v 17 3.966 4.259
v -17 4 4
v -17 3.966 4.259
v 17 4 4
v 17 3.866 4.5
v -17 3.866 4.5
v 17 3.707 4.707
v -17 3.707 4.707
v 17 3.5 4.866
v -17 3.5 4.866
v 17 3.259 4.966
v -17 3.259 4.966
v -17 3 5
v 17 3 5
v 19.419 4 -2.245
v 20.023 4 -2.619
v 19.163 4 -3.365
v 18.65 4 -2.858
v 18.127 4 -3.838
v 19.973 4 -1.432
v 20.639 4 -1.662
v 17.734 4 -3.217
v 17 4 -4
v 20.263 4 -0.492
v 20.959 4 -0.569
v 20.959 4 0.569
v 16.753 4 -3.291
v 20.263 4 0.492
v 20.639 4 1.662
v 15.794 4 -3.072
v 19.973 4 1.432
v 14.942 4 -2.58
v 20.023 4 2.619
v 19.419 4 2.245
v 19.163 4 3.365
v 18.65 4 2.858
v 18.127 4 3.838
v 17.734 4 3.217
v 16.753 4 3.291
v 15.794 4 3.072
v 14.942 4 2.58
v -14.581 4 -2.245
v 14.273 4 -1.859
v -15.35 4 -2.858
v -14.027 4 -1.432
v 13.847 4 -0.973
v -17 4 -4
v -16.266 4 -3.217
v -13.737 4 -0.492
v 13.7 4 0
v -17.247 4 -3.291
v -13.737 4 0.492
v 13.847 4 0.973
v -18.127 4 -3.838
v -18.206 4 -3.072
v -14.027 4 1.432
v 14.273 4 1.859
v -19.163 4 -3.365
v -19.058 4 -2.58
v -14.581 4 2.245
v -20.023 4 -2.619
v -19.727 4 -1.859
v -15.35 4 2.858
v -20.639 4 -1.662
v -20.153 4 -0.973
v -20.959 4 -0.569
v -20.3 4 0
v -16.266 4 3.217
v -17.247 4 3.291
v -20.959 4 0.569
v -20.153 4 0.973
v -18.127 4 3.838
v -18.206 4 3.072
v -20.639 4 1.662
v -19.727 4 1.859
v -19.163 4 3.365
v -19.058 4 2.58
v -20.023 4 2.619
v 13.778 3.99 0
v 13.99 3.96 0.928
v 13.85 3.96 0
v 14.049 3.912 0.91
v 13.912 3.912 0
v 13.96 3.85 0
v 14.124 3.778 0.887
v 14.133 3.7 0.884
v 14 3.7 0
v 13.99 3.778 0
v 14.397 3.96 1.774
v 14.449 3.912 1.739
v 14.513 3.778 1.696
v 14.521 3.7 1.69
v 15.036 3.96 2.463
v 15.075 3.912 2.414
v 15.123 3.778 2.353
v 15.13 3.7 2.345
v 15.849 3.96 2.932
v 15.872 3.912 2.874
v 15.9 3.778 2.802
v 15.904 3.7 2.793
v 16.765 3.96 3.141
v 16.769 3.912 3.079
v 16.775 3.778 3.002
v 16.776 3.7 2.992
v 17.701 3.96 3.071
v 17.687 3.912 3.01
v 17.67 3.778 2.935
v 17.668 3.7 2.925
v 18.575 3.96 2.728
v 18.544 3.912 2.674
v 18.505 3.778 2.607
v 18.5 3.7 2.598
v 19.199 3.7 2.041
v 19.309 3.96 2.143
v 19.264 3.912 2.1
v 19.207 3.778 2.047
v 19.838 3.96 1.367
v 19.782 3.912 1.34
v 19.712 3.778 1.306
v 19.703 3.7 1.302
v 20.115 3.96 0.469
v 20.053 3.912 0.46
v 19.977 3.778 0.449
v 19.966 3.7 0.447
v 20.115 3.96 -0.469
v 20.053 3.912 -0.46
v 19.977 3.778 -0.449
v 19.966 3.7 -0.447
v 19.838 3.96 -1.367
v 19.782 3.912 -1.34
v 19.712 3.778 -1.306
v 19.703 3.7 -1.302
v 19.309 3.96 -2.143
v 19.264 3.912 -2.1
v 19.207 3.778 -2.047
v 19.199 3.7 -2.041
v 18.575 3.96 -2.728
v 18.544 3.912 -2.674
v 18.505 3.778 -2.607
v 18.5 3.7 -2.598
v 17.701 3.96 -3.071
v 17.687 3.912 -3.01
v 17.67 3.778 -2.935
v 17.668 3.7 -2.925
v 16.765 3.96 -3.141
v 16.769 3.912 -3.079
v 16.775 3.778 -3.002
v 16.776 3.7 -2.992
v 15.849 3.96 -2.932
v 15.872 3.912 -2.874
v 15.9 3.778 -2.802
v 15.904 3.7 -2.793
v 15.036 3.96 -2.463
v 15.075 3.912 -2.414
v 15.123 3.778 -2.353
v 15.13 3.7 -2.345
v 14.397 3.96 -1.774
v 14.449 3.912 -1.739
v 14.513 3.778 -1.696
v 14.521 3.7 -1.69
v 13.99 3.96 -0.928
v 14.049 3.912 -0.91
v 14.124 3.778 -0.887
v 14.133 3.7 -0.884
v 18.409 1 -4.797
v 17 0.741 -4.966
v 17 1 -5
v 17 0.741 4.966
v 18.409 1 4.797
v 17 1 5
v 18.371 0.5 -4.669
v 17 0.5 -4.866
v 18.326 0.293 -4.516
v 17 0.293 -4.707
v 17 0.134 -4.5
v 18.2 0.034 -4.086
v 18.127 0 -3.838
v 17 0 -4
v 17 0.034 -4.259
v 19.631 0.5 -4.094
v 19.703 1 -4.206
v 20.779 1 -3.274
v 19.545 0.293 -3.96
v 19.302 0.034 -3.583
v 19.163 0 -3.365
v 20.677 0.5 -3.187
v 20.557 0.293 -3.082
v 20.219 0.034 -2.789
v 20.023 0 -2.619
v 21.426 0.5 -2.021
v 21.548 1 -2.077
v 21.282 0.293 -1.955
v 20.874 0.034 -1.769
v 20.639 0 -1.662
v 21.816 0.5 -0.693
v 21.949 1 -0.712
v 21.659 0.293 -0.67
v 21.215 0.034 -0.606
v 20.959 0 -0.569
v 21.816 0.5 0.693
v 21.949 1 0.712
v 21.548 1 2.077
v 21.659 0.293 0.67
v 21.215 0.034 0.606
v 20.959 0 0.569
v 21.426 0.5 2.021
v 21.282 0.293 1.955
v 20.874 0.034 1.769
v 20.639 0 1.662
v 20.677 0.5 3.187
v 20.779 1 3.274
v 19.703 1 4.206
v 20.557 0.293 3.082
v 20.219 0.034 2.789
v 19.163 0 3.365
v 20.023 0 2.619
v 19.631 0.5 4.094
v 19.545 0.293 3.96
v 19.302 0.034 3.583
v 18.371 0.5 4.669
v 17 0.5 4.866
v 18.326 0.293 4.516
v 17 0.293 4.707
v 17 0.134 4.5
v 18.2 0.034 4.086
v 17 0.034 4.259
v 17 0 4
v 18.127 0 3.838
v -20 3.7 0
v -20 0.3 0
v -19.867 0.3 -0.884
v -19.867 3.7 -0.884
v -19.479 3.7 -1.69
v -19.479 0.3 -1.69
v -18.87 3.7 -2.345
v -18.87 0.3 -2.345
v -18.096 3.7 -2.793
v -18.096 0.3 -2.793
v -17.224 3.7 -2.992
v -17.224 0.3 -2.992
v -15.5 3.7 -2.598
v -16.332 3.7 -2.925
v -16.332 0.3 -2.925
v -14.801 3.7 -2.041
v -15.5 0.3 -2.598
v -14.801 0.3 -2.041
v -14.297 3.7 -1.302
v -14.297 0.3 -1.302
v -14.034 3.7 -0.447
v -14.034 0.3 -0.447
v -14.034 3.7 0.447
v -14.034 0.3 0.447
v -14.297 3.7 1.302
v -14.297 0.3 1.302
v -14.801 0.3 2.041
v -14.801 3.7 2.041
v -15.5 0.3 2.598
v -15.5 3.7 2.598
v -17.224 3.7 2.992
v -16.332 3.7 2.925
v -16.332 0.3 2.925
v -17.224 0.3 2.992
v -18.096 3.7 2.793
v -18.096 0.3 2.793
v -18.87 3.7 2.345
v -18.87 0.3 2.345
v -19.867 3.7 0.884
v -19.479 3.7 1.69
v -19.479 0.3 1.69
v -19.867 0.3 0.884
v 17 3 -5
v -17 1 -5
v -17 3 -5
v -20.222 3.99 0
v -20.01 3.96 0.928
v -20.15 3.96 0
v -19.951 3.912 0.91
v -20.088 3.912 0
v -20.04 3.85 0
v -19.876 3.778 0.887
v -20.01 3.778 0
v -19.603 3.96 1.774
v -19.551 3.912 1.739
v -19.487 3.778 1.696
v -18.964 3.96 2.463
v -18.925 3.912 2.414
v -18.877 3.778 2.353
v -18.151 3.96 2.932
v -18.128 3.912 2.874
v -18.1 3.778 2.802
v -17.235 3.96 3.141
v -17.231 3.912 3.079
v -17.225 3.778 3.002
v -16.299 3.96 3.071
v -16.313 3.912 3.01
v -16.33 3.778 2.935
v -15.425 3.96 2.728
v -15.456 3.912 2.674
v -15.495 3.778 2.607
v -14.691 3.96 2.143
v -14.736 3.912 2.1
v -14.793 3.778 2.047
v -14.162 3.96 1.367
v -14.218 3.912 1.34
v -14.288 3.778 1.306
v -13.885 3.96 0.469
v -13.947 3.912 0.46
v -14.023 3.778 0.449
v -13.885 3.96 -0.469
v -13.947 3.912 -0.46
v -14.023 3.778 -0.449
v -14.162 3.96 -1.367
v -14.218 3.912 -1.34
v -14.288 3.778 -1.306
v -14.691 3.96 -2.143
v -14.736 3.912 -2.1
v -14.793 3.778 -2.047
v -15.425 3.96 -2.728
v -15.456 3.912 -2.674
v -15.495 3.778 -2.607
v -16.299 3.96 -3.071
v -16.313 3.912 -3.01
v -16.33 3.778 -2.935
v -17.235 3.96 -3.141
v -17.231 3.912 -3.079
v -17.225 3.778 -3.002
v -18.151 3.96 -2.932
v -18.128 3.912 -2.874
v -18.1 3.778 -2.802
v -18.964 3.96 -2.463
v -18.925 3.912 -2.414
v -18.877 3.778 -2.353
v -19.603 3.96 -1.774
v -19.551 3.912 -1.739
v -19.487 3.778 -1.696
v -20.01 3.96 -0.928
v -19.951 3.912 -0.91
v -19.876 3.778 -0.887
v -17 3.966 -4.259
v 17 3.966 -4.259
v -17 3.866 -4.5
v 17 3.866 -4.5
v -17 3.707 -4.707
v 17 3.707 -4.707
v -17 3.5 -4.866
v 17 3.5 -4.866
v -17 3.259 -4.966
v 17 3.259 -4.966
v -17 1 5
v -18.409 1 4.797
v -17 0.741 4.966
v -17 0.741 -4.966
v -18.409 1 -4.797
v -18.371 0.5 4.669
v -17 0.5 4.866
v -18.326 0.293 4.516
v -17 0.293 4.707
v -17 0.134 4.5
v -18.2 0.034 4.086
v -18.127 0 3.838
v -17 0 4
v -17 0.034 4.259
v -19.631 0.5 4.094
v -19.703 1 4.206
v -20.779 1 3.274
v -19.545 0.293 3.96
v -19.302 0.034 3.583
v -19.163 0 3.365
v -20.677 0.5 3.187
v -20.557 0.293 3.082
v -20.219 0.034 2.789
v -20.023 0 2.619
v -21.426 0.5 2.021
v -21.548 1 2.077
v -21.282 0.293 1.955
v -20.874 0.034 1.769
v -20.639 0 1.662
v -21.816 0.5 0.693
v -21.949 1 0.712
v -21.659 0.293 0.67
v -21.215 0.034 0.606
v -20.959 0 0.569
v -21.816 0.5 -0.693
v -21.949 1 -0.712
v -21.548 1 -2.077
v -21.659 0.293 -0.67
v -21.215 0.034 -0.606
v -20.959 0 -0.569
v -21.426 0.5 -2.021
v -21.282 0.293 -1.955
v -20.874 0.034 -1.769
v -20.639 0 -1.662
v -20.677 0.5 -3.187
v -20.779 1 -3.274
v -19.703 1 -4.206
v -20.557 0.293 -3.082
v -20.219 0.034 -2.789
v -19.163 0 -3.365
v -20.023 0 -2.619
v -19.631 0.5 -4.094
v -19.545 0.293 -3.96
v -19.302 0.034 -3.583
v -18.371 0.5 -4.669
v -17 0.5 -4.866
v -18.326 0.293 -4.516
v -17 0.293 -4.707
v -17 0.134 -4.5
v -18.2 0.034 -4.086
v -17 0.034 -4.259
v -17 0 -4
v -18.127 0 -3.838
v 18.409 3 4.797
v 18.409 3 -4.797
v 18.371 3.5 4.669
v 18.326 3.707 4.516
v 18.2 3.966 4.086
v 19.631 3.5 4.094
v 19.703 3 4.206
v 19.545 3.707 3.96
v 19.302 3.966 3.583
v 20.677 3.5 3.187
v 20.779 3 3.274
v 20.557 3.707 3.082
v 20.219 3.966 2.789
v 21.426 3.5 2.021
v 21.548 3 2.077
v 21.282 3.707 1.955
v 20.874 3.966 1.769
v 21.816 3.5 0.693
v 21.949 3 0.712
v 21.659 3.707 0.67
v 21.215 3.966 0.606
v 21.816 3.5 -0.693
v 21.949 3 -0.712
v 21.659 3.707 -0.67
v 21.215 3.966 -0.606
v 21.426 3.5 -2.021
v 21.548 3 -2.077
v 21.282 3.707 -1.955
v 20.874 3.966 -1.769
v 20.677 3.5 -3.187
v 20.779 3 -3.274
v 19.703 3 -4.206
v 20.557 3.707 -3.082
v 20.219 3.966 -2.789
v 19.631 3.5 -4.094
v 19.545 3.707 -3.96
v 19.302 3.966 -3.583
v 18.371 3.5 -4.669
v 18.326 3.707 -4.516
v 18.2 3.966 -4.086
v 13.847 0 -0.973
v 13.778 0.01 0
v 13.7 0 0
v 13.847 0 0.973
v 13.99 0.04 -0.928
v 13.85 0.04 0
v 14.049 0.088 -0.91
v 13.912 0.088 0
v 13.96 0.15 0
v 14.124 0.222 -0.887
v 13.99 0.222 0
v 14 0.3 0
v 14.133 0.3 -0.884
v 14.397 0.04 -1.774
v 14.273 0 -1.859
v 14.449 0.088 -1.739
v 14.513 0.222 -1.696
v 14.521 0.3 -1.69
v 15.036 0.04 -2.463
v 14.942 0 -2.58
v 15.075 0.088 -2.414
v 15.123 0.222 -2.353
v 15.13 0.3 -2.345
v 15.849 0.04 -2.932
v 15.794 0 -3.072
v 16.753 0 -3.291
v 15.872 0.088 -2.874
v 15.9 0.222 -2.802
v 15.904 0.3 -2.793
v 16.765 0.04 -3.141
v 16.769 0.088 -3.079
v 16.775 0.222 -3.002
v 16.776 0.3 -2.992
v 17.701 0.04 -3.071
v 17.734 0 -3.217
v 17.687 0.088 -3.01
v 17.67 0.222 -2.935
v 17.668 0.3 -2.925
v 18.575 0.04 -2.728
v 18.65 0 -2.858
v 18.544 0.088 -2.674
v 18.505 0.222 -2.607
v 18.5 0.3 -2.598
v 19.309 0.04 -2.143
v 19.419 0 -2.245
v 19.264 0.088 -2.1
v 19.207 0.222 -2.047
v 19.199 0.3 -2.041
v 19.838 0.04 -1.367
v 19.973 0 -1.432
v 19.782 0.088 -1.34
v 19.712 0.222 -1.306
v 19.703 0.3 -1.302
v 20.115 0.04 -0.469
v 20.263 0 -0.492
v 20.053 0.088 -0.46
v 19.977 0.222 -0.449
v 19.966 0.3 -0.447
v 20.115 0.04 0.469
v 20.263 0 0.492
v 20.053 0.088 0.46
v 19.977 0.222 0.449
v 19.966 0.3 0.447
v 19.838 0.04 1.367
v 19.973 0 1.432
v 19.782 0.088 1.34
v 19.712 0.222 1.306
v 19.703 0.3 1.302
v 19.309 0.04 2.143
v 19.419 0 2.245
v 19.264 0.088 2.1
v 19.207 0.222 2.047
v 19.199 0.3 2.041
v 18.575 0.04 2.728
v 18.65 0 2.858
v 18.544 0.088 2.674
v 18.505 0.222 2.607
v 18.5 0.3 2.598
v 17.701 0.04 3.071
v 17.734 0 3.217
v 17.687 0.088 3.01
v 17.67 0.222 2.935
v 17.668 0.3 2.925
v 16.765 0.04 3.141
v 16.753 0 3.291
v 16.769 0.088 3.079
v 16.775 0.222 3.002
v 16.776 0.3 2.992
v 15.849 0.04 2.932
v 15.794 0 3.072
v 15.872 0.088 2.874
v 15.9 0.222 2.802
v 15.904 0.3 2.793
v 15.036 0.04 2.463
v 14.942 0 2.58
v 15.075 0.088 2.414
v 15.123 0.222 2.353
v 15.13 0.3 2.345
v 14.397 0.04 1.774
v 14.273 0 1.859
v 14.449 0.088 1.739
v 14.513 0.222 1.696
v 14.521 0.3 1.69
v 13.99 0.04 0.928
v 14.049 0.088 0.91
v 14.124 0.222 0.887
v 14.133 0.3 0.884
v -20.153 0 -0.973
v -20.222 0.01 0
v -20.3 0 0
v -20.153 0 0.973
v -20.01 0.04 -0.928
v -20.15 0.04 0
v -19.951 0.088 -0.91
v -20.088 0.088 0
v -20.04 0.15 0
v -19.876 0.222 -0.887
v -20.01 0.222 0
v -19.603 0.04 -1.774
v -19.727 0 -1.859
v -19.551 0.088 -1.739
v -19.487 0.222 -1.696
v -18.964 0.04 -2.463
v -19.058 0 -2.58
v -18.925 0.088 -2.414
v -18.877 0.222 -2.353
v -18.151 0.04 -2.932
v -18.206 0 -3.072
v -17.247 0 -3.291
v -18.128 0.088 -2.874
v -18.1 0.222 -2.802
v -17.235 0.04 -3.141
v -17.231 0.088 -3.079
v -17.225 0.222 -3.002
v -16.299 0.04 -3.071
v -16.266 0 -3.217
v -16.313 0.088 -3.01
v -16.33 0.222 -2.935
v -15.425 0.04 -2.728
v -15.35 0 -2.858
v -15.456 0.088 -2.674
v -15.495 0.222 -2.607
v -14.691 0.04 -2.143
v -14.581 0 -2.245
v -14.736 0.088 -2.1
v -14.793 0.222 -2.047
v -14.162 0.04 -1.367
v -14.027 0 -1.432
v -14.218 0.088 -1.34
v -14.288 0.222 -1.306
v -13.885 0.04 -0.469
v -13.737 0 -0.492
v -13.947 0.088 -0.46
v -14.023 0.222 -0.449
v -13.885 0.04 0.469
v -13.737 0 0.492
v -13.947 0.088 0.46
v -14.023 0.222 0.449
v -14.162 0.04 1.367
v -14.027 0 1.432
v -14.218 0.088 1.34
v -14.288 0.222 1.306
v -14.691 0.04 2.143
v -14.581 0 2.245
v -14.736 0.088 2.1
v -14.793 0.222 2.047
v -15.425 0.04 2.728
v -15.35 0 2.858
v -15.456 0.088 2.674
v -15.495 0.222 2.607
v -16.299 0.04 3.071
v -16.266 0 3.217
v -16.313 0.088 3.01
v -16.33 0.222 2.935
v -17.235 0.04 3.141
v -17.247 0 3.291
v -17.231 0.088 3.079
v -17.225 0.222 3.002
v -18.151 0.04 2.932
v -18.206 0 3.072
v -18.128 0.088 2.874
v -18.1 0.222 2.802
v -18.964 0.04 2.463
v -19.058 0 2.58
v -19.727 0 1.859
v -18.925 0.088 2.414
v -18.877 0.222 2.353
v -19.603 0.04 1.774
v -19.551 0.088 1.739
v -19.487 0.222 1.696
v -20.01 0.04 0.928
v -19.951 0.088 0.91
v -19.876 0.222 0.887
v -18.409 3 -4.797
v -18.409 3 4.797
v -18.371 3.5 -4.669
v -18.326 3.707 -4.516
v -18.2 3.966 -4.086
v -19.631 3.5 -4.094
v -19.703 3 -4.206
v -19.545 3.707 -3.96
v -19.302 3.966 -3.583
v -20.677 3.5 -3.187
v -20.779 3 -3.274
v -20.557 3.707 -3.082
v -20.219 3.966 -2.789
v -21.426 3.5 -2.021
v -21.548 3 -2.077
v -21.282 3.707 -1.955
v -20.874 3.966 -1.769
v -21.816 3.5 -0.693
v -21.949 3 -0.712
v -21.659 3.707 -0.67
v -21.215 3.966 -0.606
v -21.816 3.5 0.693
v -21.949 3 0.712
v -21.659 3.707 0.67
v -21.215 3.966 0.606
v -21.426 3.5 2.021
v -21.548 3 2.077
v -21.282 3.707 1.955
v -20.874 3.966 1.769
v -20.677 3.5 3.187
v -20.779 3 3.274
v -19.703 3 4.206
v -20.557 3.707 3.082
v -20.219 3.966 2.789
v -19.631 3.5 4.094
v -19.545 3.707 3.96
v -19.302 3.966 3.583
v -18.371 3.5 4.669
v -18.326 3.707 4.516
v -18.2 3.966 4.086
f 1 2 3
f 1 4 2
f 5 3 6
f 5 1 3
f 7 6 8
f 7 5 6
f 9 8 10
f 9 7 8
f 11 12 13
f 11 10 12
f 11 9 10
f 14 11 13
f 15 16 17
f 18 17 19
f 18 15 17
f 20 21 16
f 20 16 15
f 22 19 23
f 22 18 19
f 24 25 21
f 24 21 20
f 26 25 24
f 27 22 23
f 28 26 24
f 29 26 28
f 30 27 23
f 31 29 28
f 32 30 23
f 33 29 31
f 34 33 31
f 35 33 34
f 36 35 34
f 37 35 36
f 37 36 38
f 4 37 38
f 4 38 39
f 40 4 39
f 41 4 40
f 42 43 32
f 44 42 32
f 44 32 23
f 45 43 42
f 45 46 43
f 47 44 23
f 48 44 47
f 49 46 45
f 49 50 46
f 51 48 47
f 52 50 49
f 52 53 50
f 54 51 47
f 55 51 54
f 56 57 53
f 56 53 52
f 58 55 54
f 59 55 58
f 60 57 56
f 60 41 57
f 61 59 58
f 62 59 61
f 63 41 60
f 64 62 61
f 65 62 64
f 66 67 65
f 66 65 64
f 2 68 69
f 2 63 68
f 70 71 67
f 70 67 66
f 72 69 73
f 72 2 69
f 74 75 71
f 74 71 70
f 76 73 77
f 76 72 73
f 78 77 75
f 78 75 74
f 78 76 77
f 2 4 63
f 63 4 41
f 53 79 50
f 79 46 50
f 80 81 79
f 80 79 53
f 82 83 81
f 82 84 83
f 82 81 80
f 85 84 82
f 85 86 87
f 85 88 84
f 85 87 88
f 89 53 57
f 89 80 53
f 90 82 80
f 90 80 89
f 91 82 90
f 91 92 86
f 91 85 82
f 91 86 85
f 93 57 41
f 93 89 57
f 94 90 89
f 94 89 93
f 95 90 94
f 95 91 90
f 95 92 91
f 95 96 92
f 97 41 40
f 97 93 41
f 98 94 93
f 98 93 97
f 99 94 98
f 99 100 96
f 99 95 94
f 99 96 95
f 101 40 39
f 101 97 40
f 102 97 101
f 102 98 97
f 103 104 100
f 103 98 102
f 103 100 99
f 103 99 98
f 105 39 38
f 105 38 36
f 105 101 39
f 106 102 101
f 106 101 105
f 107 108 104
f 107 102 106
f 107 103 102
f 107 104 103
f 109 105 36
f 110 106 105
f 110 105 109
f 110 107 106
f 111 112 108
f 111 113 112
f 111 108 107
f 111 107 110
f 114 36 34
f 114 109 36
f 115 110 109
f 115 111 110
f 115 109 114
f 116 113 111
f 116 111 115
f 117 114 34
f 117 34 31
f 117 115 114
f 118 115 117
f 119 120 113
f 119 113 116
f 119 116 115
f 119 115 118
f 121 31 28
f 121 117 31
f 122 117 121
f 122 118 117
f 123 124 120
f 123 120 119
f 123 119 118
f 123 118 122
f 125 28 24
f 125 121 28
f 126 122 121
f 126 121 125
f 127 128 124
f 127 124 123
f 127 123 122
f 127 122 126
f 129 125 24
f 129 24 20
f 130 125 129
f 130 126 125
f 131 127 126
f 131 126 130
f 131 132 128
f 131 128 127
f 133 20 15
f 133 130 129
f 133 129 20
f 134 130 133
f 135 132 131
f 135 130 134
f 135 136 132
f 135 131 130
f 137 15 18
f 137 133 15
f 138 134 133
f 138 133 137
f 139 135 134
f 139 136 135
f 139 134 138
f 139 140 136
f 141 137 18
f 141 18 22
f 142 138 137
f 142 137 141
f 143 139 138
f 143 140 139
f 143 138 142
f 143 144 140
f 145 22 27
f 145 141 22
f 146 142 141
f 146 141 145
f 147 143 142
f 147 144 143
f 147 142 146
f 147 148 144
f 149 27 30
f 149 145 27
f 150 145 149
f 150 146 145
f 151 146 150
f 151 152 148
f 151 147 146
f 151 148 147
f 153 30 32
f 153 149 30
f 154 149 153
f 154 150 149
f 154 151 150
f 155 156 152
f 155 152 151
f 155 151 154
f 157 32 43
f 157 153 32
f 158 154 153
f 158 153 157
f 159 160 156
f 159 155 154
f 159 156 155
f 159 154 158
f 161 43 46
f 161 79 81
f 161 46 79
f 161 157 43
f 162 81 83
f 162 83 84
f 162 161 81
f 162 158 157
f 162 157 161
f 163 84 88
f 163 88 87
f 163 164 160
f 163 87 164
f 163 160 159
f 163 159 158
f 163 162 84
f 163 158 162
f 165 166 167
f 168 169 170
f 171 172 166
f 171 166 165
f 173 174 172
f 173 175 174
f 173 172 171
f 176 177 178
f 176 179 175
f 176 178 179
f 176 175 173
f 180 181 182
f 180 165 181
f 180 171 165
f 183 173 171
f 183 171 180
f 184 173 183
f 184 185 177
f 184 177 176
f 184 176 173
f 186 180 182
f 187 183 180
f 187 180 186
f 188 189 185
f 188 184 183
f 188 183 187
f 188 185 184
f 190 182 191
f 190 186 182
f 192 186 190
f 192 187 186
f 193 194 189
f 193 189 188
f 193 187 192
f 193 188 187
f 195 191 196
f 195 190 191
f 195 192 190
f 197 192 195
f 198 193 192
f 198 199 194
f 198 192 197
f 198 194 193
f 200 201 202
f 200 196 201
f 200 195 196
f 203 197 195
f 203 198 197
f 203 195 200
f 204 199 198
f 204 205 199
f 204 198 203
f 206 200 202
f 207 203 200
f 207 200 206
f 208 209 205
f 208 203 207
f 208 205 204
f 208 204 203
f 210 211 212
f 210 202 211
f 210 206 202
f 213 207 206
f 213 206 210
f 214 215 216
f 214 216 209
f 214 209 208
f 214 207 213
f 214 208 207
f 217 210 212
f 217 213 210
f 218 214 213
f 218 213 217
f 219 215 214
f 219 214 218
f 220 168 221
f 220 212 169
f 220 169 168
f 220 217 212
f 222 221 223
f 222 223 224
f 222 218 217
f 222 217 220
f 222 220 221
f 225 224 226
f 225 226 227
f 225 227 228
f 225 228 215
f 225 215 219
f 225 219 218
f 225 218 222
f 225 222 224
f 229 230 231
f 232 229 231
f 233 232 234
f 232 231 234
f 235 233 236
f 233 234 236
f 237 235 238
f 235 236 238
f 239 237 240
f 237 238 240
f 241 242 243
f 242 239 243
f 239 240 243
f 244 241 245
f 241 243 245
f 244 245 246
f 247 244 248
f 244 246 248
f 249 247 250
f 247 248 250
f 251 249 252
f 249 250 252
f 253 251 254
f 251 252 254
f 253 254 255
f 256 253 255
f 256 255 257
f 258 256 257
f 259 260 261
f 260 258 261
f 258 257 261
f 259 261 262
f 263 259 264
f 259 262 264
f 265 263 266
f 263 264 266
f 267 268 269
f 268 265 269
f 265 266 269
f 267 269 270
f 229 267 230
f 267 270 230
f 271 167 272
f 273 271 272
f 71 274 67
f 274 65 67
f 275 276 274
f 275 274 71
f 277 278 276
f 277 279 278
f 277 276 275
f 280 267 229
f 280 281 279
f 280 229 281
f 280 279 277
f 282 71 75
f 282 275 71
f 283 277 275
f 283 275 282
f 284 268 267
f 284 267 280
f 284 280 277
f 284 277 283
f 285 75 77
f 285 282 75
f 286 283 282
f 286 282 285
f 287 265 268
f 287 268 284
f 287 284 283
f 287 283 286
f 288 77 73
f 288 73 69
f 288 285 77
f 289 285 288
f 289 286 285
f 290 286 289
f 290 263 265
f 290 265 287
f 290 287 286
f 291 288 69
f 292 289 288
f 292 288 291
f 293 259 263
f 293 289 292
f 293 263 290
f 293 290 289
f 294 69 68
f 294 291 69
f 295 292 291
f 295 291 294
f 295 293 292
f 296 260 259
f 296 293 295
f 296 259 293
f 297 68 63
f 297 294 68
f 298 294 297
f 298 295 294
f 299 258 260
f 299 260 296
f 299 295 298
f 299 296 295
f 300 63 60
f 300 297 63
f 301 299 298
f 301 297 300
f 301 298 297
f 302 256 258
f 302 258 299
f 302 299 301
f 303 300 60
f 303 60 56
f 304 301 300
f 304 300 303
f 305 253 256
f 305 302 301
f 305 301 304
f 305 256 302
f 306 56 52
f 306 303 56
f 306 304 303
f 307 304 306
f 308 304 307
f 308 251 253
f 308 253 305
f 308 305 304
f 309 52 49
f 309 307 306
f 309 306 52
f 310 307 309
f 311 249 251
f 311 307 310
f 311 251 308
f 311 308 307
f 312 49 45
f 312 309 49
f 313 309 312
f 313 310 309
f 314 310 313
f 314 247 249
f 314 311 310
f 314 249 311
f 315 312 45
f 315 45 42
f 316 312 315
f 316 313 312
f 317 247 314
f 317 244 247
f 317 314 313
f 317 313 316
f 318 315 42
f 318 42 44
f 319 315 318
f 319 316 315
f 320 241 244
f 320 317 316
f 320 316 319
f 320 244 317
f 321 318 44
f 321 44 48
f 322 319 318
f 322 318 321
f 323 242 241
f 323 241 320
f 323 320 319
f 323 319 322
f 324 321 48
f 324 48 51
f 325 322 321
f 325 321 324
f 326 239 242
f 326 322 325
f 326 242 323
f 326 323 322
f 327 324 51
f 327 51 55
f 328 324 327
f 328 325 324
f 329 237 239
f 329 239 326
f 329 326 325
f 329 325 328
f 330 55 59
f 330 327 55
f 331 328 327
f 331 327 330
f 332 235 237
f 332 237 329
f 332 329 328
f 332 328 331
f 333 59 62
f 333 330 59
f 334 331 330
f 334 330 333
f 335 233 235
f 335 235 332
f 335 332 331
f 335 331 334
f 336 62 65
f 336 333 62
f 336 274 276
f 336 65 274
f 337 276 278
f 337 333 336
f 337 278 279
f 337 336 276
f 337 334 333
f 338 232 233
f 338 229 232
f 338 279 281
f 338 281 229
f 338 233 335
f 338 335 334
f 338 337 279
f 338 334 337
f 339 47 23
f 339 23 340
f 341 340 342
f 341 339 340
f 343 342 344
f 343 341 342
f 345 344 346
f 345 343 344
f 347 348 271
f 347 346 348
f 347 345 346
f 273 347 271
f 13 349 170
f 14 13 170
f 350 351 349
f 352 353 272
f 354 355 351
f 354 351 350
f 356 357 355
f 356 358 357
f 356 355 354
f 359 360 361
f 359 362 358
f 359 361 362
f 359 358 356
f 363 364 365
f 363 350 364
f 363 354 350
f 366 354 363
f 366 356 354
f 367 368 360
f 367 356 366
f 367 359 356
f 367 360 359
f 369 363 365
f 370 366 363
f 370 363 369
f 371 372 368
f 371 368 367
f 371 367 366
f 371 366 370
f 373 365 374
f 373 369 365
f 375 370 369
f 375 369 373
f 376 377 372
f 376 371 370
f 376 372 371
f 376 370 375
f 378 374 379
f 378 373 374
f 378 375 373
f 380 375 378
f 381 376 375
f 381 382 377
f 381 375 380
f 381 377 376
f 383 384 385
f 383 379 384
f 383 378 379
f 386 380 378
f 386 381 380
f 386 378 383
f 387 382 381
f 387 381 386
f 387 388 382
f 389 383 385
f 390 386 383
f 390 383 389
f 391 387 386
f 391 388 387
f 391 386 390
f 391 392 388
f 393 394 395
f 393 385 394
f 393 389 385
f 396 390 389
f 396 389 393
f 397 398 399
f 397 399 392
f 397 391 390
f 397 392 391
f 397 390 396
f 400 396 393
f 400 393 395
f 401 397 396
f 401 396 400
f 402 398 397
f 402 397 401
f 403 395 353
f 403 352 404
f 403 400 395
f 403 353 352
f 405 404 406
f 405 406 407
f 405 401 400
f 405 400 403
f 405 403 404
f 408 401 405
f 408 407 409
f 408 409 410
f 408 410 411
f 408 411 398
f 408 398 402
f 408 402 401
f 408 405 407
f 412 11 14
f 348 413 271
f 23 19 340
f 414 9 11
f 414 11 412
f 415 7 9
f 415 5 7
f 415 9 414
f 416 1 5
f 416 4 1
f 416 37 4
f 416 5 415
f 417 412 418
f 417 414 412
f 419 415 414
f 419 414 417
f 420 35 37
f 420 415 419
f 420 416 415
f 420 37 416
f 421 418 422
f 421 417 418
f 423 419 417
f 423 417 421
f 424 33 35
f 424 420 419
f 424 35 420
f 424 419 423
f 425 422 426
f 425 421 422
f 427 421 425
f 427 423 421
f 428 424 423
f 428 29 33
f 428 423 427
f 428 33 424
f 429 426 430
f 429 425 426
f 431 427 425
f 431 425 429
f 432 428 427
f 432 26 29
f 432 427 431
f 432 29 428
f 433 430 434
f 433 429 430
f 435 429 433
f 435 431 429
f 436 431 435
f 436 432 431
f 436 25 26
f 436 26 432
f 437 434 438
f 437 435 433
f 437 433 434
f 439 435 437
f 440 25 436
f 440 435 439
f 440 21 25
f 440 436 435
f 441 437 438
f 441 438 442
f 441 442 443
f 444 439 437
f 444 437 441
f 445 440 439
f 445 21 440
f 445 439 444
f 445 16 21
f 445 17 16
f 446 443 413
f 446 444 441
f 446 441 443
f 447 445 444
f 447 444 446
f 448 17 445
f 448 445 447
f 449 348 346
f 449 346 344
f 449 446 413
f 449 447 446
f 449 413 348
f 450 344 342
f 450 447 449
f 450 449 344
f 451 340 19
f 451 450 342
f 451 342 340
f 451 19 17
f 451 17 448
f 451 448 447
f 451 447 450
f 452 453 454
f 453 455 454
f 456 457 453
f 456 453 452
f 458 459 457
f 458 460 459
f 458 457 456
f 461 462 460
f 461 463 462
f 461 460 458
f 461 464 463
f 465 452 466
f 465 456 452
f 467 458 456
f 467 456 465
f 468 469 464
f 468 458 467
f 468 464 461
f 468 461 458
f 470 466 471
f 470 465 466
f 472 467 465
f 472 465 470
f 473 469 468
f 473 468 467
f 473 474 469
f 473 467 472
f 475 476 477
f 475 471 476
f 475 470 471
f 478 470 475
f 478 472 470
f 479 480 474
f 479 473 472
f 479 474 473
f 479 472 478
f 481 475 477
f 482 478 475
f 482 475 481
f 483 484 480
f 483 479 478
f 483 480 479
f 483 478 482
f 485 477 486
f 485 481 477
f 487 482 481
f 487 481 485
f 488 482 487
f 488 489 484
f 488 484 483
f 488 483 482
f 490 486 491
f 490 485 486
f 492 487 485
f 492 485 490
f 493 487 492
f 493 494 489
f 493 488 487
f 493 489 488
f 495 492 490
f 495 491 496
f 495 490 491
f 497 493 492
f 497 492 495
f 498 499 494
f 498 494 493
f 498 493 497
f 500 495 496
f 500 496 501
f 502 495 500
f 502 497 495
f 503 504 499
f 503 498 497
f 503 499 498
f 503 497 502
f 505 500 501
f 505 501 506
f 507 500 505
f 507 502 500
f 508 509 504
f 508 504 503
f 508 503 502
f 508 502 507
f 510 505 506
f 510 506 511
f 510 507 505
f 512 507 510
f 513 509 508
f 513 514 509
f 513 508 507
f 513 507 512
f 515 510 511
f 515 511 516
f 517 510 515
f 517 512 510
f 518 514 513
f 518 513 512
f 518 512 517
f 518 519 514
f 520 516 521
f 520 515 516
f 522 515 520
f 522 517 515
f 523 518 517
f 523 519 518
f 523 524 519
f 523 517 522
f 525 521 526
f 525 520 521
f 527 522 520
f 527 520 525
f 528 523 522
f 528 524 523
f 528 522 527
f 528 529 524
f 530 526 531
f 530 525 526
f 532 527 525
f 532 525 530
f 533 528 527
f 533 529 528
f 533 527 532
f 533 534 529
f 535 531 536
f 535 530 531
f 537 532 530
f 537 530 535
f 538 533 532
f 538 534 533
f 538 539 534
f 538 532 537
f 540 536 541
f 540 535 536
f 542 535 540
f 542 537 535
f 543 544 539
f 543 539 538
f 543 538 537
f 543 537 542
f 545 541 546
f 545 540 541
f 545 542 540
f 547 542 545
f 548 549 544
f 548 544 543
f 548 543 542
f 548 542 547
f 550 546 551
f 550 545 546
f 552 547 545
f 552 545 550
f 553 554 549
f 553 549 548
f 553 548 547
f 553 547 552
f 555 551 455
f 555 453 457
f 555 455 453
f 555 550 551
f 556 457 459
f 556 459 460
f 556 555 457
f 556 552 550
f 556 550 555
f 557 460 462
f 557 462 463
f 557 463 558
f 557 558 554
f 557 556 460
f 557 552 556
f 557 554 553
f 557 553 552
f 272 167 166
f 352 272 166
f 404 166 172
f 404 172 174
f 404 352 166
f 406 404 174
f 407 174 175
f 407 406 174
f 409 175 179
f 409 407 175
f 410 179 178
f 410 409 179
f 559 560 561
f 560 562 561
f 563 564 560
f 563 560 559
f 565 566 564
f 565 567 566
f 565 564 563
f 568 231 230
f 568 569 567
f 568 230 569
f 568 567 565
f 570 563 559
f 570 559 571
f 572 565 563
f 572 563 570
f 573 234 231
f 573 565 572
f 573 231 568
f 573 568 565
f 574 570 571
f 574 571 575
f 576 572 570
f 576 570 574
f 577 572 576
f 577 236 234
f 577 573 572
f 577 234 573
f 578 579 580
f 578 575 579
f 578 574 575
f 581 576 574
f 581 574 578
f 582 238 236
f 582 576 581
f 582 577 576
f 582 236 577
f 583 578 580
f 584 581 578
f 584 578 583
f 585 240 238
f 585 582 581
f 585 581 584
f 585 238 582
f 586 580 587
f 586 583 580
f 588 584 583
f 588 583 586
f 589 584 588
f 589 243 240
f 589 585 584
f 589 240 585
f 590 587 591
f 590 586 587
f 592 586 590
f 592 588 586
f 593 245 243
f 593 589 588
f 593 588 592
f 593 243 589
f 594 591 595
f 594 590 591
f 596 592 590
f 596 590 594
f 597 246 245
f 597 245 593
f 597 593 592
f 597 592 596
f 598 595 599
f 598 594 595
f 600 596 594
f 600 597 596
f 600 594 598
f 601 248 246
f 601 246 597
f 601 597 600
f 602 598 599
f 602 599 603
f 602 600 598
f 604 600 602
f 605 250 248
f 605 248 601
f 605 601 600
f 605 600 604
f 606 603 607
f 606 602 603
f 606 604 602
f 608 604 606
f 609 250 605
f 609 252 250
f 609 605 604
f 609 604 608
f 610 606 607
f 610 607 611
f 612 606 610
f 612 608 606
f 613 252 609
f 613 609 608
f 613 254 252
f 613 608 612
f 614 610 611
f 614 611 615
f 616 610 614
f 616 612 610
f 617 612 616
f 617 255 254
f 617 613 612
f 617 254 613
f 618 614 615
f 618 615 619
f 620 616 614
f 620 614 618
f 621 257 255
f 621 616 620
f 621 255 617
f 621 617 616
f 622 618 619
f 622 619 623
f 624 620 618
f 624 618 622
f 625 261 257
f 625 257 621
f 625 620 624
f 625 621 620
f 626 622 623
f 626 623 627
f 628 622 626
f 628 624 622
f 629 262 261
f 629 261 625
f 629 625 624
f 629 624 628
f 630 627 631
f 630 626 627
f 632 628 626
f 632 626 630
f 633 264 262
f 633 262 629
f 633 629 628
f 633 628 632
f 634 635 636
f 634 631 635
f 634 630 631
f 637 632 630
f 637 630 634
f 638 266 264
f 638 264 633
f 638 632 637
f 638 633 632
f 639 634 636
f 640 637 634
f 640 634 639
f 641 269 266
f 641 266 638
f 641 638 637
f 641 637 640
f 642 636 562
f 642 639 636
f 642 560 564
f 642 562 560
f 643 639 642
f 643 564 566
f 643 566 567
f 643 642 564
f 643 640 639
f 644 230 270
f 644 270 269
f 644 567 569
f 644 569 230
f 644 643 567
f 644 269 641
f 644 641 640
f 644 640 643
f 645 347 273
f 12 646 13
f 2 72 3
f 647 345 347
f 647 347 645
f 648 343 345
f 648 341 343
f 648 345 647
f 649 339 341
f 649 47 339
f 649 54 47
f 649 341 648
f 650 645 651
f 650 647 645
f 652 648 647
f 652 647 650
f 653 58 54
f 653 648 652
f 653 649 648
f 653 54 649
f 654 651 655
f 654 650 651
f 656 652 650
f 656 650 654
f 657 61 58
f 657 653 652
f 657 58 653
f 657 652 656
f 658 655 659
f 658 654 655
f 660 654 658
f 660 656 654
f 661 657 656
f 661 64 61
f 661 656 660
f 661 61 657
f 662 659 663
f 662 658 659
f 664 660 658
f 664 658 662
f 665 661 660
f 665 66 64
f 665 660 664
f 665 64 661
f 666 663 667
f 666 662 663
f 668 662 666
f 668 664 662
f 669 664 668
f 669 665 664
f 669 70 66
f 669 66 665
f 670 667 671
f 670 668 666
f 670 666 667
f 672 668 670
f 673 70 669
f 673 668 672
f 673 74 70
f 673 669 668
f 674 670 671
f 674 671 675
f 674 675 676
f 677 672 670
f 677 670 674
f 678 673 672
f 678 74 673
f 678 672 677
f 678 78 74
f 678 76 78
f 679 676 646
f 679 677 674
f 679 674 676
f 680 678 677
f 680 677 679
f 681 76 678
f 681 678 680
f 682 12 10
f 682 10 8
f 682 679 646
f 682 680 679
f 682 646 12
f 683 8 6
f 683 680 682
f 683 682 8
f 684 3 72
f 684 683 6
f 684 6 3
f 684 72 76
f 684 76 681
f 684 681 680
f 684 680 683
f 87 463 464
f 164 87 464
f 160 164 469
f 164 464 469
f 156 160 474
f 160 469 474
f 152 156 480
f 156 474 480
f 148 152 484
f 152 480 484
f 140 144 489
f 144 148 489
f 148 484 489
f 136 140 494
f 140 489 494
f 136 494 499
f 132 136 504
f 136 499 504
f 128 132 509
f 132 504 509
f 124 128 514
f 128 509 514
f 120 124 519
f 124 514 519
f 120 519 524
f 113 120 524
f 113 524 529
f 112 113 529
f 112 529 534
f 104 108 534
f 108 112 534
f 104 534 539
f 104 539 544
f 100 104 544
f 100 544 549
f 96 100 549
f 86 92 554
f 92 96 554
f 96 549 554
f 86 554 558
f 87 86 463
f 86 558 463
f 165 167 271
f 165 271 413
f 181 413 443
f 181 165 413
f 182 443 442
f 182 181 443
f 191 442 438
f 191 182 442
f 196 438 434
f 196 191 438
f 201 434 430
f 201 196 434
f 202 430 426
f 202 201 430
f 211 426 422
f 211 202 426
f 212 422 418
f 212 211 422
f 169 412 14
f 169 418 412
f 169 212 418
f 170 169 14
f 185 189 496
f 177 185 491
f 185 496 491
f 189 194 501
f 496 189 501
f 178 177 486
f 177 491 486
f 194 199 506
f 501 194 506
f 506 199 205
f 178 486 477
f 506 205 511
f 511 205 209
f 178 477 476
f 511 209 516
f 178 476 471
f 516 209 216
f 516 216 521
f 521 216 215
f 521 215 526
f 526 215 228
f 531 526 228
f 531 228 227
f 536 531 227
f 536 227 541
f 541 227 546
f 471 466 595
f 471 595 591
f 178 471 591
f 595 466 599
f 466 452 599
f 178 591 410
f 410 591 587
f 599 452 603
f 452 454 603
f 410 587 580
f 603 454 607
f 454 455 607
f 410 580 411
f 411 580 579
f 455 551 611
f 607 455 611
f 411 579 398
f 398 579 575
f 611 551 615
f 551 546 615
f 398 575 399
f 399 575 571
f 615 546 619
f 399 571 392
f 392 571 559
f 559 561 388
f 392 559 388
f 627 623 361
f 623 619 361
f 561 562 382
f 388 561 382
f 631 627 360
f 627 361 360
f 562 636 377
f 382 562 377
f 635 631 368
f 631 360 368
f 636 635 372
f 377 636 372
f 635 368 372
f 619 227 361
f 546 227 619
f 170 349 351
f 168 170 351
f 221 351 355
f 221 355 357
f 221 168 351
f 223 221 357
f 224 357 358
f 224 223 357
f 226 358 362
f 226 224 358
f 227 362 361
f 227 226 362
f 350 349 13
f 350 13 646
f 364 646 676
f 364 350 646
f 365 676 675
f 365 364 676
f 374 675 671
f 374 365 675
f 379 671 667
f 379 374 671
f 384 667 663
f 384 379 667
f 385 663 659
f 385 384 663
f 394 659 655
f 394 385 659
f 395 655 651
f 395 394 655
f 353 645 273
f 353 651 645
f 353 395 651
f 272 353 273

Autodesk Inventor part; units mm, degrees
ref_plane "YZ Plane" through (0, 0, 0) normal (1, 0, 0) x (0, 1, 0)
ref_plane "XY Plane" through (0, 0, 0) normal (0, 0, 1) x (1, 0, 0)
sketch "Эскиз1" plane through (0, 0, 0) normal (0, 1, 0) x (-1, 0, 0)
  line L0 (17, 0) -> (-17, 0) construction
  line L1 (17, 5) -> (-17, 5)
  line L2 (-17, -5) -> (17, -5)
  arc A0 (17, -5) -> (17, 5) centre (17, 0) ccw
  arc A1 (-17, 5) -> (-17, -5) centre (-17, 0) ccw
  circle A2 centre (17, 0) radius 3
  circle A3 centre (-17, 0) radius 3
  point P0 (0, 0)
  point P1 (0, 0)
  dimension "d0" = 34
  dimension "d1" = 10
  dimension "d2" = 6
extrude "Выдавливание1" add sketch "Эскиз1" along normal blind 4
fillet "Сопряжение1" radius 1 8 edges at (22, 4, 0) (0, 4, -5) (-22, 4, 0) (0, 4, 5) (22, 0, 0) (0, 0, -5) (-22, 0, 0) (0, 0, 5)
fillet "Сопряжение2" radius 0.3 4 edges at (-14, 0, 0) (-14, 4, 0) (20, 0, 0) (20, 4, 0)
properties part number "рычаг-1"
